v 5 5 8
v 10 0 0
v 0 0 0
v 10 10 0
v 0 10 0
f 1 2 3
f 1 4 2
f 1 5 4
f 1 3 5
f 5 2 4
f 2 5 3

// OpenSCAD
polyhedron(
  points = [[0,0,0],[10,0,0],[10,10,0],[0,10,0],[5,5,8]],
  faces  = [[0,1,4],[1,2,4],[2,3,4],[3,0,4],[3,2,1,0]]);
